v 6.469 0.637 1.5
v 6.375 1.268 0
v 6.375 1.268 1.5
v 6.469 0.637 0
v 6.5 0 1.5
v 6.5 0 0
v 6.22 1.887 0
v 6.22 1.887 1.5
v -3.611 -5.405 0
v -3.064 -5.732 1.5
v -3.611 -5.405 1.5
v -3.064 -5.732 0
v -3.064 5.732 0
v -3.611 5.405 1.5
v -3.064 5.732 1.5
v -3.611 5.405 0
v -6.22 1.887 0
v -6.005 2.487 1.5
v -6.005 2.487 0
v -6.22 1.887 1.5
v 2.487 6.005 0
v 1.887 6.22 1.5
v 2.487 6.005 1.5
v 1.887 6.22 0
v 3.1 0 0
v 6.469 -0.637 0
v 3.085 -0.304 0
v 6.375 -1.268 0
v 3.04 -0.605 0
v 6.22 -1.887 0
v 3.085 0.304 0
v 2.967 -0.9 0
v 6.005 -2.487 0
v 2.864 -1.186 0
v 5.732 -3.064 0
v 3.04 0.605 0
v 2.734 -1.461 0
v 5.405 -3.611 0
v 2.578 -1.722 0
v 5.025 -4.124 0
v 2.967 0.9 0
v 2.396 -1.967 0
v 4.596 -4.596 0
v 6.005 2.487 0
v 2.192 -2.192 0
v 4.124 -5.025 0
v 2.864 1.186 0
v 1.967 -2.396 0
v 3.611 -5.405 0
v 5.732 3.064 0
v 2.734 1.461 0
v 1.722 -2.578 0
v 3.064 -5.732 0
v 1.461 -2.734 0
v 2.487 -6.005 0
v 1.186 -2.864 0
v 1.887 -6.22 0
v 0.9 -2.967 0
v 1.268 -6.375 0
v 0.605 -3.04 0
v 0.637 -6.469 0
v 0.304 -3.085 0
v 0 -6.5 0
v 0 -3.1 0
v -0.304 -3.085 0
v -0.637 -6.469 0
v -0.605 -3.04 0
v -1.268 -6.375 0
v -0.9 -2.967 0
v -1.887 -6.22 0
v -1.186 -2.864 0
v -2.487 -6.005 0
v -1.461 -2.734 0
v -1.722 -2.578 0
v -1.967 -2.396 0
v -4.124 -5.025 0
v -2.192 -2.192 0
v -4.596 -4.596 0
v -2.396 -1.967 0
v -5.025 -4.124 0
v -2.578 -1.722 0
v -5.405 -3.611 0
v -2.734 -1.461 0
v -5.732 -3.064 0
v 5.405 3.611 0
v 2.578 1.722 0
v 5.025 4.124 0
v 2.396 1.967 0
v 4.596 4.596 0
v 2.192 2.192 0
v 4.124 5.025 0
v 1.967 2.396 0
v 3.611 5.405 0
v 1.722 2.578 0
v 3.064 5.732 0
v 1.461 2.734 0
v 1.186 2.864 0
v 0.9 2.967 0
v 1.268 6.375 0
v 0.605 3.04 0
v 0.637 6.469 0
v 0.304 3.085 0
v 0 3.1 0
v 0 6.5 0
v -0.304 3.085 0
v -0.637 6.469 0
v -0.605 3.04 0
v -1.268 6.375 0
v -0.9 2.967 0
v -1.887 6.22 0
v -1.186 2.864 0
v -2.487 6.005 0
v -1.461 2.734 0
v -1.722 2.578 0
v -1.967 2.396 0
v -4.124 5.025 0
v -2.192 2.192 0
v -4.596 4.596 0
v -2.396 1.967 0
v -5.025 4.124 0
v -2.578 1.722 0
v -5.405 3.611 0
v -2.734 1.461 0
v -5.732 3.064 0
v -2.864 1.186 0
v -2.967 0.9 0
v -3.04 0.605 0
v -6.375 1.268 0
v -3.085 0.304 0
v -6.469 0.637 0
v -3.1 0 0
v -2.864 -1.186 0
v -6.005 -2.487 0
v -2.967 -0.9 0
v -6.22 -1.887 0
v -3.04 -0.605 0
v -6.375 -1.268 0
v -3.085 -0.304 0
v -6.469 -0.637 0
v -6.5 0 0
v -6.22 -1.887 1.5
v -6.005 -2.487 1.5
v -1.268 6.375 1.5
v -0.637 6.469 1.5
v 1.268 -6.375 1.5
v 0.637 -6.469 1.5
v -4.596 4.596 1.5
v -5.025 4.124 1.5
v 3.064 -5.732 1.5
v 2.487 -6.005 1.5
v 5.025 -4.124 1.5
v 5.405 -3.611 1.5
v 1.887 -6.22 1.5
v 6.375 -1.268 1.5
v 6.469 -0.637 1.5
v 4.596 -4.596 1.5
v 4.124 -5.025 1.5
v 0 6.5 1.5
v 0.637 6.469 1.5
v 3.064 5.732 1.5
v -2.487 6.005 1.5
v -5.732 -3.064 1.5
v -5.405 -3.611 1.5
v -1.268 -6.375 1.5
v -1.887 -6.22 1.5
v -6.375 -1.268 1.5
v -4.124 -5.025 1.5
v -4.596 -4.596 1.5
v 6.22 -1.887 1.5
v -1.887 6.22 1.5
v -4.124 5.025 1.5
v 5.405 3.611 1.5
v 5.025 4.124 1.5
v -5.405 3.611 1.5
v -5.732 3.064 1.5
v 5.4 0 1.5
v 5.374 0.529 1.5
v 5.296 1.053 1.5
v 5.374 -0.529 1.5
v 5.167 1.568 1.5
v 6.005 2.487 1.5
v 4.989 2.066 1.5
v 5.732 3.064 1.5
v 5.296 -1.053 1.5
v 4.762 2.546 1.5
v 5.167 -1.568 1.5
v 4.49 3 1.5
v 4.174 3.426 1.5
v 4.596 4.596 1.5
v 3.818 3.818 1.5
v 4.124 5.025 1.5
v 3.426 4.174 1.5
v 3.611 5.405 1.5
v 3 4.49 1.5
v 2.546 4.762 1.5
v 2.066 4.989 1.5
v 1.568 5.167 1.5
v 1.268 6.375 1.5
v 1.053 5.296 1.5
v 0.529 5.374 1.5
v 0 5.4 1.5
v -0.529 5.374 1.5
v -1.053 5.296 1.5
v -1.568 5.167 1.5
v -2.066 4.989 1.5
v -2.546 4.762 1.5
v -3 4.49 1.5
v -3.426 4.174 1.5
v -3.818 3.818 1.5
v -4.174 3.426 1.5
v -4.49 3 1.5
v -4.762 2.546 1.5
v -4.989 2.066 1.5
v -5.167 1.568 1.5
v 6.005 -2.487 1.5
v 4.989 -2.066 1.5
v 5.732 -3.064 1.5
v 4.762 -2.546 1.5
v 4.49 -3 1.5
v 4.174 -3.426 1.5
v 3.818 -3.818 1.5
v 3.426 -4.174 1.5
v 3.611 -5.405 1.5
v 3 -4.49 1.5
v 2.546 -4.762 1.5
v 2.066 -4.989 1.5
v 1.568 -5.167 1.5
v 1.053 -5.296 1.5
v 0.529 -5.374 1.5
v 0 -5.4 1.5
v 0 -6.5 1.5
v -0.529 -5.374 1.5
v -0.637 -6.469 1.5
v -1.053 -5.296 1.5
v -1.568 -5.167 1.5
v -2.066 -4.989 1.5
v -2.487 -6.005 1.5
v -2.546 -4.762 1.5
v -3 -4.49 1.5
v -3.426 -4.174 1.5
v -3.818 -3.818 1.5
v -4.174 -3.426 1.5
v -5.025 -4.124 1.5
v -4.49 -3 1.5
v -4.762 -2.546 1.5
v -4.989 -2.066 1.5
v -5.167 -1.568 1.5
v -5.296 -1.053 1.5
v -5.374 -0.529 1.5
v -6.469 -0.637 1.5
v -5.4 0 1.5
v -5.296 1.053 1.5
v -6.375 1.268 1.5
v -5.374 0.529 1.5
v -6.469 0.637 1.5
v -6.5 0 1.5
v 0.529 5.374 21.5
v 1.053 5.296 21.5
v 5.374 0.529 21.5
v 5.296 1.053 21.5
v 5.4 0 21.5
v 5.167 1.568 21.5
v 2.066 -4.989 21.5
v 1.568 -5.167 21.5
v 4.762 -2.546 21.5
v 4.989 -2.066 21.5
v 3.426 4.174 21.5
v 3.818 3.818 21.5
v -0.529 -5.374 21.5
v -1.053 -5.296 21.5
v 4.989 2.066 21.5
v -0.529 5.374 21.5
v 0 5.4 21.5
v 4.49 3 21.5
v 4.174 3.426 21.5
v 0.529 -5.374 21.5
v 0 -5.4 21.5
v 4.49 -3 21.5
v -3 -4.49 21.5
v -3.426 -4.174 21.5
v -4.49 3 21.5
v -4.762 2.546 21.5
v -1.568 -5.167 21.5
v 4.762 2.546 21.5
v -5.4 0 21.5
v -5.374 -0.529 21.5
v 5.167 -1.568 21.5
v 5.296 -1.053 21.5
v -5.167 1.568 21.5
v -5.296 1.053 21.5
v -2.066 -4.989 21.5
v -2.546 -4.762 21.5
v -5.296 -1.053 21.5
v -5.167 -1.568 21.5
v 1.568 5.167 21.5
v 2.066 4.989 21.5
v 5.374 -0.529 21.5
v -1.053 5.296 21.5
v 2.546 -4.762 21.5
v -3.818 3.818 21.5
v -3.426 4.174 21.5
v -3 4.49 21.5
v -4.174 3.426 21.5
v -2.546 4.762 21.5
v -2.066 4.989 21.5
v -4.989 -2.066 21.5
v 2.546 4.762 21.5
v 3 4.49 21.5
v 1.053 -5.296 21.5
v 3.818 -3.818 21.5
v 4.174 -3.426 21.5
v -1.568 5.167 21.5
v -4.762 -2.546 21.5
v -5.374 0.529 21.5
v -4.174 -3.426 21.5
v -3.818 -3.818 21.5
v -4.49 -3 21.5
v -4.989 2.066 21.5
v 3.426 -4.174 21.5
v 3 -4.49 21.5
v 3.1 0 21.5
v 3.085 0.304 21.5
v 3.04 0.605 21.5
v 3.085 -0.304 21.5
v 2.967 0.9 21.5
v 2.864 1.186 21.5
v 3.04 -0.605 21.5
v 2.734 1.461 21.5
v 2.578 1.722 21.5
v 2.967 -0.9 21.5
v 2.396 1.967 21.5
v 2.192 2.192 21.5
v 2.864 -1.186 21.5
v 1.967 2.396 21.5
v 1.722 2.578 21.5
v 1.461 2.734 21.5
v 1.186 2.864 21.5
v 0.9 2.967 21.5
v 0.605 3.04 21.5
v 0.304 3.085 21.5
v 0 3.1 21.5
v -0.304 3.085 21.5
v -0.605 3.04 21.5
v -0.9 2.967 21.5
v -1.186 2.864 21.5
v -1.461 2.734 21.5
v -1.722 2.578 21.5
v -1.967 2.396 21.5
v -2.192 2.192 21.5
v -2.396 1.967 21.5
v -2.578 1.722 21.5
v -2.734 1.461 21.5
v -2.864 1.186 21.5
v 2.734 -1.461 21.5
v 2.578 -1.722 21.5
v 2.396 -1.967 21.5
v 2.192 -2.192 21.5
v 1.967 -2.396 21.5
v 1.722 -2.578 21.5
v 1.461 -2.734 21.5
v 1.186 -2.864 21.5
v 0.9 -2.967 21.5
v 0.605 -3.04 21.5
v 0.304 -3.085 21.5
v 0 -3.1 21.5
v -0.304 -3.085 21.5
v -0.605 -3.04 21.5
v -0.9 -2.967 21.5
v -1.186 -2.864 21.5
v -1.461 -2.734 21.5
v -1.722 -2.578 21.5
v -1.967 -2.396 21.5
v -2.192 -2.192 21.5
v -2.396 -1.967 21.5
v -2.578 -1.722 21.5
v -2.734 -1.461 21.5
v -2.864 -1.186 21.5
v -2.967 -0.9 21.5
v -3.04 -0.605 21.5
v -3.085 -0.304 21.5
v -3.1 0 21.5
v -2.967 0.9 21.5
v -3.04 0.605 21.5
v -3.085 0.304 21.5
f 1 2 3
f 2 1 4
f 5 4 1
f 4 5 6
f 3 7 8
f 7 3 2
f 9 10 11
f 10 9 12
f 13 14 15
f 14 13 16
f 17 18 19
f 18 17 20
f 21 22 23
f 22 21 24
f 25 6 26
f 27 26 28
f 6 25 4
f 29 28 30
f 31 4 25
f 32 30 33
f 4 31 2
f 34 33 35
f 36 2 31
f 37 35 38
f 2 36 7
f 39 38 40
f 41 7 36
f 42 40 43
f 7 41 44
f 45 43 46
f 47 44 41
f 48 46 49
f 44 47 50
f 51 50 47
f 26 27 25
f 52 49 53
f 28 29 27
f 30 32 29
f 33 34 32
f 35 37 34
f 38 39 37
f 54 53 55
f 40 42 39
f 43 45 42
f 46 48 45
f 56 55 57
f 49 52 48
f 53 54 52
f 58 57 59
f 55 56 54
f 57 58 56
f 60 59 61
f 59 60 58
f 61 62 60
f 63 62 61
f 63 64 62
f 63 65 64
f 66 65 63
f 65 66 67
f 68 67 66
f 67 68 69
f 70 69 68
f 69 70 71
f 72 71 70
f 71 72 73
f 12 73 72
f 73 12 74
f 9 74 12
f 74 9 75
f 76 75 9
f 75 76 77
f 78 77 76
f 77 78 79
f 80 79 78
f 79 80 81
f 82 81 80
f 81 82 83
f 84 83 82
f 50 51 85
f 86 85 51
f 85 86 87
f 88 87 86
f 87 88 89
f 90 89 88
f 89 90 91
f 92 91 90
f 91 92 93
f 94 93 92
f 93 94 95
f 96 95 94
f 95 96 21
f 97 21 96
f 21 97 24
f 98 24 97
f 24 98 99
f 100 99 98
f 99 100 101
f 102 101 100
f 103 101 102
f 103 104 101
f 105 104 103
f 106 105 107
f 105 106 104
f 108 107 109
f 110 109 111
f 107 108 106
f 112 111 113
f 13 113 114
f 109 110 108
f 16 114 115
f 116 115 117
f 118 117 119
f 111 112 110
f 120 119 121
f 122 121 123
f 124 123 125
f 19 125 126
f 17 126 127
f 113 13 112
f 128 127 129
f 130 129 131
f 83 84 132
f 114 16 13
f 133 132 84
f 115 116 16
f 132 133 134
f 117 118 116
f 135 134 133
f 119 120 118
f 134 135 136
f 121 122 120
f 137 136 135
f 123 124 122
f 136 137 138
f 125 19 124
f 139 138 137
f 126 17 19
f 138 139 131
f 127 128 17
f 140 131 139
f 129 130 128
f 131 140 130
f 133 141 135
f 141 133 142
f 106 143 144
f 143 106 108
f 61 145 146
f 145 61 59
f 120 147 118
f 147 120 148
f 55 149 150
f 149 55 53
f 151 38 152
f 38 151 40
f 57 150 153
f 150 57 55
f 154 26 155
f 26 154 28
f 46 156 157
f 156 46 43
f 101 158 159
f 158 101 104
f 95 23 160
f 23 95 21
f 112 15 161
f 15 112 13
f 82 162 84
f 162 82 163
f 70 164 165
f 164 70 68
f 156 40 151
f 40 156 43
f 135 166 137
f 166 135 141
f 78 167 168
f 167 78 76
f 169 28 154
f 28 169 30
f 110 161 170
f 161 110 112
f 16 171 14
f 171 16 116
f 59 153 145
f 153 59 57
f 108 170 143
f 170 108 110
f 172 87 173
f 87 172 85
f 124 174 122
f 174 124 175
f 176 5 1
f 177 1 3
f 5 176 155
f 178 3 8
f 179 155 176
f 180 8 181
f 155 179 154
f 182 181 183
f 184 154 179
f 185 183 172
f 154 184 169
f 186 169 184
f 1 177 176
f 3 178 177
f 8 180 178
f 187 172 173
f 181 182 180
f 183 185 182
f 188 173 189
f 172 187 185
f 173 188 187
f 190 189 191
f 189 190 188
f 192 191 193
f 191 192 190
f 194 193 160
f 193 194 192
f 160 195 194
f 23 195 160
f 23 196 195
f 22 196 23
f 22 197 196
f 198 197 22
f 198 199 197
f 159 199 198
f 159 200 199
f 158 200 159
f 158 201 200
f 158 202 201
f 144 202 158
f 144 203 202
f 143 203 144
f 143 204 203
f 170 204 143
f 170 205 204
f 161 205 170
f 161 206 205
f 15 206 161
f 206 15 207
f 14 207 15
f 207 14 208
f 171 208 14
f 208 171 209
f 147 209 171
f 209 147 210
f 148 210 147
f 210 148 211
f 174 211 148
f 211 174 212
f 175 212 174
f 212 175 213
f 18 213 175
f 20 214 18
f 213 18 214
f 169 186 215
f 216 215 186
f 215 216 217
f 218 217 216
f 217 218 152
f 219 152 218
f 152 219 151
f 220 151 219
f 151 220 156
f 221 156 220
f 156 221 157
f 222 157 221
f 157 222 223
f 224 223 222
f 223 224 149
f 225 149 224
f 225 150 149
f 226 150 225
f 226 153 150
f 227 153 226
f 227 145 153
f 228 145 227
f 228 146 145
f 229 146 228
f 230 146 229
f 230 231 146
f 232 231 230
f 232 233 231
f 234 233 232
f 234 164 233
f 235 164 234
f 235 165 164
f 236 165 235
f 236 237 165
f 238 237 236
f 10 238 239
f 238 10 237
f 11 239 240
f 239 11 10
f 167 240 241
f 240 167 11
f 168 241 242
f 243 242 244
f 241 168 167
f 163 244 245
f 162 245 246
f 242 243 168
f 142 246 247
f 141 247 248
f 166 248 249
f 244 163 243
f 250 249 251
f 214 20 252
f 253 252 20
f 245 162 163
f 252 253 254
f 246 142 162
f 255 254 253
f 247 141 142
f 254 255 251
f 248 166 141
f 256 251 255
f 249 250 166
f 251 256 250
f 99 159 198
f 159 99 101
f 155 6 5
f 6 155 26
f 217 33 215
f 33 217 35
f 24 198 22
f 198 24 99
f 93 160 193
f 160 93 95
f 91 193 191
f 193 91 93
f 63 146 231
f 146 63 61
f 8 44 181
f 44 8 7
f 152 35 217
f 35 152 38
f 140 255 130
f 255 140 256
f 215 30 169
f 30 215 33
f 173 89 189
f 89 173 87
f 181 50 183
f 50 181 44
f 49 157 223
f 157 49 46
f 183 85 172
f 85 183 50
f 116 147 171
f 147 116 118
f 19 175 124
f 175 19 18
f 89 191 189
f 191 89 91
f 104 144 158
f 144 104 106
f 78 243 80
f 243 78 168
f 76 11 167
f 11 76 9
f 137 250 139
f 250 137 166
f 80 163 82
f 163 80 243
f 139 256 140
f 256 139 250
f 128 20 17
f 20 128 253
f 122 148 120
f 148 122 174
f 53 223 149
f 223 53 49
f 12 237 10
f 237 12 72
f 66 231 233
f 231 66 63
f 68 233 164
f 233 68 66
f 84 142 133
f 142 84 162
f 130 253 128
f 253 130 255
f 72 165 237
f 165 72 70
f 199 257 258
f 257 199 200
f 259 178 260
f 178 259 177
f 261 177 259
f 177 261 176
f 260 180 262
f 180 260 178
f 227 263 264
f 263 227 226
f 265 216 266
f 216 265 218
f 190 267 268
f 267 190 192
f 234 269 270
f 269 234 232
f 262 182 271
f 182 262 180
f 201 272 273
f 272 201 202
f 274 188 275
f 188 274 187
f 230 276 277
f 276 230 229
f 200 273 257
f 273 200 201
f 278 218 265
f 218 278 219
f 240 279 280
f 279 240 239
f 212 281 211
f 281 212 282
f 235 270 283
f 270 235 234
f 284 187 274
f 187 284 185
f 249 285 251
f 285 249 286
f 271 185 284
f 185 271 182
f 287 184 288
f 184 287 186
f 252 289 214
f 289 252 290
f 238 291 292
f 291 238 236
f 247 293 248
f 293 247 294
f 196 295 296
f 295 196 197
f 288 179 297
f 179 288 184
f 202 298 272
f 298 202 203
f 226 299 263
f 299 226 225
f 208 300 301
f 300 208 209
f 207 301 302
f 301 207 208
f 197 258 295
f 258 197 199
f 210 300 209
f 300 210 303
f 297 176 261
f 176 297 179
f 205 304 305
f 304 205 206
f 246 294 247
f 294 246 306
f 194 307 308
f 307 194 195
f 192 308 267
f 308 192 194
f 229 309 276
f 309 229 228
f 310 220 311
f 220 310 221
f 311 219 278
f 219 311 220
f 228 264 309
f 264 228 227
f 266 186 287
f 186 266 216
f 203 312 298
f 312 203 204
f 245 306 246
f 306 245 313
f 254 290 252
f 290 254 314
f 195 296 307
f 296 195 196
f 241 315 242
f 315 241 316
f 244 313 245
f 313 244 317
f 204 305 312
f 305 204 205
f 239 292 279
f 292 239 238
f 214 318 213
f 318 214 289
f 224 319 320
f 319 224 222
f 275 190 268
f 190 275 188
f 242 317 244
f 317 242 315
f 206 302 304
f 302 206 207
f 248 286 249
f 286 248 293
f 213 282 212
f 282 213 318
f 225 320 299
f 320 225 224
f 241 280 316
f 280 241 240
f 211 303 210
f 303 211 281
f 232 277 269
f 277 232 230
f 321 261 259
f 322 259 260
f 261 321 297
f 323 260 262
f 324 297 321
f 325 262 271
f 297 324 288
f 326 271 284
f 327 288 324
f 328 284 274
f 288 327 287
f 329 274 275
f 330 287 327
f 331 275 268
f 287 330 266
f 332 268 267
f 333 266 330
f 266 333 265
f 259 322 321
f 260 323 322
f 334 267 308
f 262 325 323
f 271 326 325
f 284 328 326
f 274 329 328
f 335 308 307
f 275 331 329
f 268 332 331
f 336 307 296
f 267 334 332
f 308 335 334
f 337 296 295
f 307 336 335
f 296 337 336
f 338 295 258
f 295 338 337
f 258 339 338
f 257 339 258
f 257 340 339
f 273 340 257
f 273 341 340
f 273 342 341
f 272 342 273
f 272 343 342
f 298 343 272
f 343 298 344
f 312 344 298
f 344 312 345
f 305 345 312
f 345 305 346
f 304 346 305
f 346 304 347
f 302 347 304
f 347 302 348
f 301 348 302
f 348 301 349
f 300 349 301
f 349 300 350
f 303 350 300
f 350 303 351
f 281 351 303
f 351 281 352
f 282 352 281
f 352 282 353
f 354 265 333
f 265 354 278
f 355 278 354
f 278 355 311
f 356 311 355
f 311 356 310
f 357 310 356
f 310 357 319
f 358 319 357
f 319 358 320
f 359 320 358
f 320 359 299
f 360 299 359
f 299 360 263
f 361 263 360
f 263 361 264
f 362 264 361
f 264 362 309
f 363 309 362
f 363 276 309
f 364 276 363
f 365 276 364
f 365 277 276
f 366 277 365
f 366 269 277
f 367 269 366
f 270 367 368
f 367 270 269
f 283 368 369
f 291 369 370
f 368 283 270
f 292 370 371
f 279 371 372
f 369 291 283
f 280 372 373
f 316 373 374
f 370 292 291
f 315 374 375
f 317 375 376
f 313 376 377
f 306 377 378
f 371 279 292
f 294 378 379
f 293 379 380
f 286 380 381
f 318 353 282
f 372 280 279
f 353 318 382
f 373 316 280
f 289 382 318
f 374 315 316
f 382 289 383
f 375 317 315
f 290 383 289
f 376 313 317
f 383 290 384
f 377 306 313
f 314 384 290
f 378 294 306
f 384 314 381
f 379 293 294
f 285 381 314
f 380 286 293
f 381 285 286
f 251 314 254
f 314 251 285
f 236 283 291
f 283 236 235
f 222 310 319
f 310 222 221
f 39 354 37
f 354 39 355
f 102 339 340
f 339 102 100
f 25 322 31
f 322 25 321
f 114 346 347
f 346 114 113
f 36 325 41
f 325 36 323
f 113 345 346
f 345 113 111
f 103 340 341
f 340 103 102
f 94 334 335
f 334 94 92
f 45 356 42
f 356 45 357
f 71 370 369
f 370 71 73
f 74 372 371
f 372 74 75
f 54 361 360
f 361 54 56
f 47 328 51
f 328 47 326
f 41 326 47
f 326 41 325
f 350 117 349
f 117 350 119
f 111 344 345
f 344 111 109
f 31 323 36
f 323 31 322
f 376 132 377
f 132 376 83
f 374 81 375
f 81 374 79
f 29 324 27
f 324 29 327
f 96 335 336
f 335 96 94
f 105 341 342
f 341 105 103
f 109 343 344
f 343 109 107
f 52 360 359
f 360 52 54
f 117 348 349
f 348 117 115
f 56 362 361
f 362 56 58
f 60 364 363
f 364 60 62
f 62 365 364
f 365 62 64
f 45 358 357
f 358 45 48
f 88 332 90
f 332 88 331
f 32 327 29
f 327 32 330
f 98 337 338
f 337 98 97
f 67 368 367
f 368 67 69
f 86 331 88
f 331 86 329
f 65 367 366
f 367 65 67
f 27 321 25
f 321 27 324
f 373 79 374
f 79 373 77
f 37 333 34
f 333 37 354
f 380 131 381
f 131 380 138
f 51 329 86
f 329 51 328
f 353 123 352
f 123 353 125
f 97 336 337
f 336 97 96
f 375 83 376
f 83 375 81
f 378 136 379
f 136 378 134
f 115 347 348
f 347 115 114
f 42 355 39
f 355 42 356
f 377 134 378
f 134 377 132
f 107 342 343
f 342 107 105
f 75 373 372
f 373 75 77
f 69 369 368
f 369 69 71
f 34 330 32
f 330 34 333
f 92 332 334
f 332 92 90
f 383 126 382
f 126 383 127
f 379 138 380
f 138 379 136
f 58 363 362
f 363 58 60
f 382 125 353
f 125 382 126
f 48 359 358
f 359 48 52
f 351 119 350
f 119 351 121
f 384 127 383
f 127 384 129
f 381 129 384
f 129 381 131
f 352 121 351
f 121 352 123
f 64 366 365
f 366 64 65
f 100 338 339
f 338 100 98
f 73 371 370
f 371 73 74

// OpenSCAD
// Adapter sleeve: 0.2 mL PCR tube into a 1.5 mL tube rack hole
// Print orientation: collar (13 mm dia, 1.5 mm thick) on the bed, sleeve body rising to z = 21.5

// ---- Dimensions (mm) ----
collar_dia   = 13.0;   // outer diameter of the base collar
collar_thk   = 1.5;    // thickness of the base collar (z = 0 to 1.5)
sleeve_od    = 10.8;   // outer diameter of the sleeve body
sleeve_top   = 21.5;   // top z of the sleeve body (full part height)
bore_dia     = 6.2;    // straight through-bore diameter

// ---- Derived values ----
collar_r     = collar_dia / 2;   // 6.5
sleeve_r     = sleeve_od  / 2;   // 5.4
bore_r       = bore_dia / 2;     // 3.1

// ---- Curvature resolution ----
$fn = 64;

// ---- Build the solid ----
// Outer profile: collar (z 0..1.5) + sleeve body (z 1.5..21.5)
// Bore: straight 6.2 mm hole through the full height, open at both ends.
// The bore cutter is extended 1 mm past each face so no faces are coplanar.

difference() {
    union() {
        // Base collar
        cylinder(h = collar_thk, d = collar_dia, $fn = $fn);

        // Sleeve body, rising from the top of the collar to z = 21.5
        translate([0, 0, collar_thk])
            cylinder(h = sleeve_top - collar_thk, d = sleeve_od, $fn = $fn);
    }

    // Through-bore, extended 1 mm past the bottom (z = -1) and top (z = 22.5)
    translate([0, 0, -1])
        cylinder(h = sleeve_top + 2, d = bore_dia, $fn = $fn);
}
